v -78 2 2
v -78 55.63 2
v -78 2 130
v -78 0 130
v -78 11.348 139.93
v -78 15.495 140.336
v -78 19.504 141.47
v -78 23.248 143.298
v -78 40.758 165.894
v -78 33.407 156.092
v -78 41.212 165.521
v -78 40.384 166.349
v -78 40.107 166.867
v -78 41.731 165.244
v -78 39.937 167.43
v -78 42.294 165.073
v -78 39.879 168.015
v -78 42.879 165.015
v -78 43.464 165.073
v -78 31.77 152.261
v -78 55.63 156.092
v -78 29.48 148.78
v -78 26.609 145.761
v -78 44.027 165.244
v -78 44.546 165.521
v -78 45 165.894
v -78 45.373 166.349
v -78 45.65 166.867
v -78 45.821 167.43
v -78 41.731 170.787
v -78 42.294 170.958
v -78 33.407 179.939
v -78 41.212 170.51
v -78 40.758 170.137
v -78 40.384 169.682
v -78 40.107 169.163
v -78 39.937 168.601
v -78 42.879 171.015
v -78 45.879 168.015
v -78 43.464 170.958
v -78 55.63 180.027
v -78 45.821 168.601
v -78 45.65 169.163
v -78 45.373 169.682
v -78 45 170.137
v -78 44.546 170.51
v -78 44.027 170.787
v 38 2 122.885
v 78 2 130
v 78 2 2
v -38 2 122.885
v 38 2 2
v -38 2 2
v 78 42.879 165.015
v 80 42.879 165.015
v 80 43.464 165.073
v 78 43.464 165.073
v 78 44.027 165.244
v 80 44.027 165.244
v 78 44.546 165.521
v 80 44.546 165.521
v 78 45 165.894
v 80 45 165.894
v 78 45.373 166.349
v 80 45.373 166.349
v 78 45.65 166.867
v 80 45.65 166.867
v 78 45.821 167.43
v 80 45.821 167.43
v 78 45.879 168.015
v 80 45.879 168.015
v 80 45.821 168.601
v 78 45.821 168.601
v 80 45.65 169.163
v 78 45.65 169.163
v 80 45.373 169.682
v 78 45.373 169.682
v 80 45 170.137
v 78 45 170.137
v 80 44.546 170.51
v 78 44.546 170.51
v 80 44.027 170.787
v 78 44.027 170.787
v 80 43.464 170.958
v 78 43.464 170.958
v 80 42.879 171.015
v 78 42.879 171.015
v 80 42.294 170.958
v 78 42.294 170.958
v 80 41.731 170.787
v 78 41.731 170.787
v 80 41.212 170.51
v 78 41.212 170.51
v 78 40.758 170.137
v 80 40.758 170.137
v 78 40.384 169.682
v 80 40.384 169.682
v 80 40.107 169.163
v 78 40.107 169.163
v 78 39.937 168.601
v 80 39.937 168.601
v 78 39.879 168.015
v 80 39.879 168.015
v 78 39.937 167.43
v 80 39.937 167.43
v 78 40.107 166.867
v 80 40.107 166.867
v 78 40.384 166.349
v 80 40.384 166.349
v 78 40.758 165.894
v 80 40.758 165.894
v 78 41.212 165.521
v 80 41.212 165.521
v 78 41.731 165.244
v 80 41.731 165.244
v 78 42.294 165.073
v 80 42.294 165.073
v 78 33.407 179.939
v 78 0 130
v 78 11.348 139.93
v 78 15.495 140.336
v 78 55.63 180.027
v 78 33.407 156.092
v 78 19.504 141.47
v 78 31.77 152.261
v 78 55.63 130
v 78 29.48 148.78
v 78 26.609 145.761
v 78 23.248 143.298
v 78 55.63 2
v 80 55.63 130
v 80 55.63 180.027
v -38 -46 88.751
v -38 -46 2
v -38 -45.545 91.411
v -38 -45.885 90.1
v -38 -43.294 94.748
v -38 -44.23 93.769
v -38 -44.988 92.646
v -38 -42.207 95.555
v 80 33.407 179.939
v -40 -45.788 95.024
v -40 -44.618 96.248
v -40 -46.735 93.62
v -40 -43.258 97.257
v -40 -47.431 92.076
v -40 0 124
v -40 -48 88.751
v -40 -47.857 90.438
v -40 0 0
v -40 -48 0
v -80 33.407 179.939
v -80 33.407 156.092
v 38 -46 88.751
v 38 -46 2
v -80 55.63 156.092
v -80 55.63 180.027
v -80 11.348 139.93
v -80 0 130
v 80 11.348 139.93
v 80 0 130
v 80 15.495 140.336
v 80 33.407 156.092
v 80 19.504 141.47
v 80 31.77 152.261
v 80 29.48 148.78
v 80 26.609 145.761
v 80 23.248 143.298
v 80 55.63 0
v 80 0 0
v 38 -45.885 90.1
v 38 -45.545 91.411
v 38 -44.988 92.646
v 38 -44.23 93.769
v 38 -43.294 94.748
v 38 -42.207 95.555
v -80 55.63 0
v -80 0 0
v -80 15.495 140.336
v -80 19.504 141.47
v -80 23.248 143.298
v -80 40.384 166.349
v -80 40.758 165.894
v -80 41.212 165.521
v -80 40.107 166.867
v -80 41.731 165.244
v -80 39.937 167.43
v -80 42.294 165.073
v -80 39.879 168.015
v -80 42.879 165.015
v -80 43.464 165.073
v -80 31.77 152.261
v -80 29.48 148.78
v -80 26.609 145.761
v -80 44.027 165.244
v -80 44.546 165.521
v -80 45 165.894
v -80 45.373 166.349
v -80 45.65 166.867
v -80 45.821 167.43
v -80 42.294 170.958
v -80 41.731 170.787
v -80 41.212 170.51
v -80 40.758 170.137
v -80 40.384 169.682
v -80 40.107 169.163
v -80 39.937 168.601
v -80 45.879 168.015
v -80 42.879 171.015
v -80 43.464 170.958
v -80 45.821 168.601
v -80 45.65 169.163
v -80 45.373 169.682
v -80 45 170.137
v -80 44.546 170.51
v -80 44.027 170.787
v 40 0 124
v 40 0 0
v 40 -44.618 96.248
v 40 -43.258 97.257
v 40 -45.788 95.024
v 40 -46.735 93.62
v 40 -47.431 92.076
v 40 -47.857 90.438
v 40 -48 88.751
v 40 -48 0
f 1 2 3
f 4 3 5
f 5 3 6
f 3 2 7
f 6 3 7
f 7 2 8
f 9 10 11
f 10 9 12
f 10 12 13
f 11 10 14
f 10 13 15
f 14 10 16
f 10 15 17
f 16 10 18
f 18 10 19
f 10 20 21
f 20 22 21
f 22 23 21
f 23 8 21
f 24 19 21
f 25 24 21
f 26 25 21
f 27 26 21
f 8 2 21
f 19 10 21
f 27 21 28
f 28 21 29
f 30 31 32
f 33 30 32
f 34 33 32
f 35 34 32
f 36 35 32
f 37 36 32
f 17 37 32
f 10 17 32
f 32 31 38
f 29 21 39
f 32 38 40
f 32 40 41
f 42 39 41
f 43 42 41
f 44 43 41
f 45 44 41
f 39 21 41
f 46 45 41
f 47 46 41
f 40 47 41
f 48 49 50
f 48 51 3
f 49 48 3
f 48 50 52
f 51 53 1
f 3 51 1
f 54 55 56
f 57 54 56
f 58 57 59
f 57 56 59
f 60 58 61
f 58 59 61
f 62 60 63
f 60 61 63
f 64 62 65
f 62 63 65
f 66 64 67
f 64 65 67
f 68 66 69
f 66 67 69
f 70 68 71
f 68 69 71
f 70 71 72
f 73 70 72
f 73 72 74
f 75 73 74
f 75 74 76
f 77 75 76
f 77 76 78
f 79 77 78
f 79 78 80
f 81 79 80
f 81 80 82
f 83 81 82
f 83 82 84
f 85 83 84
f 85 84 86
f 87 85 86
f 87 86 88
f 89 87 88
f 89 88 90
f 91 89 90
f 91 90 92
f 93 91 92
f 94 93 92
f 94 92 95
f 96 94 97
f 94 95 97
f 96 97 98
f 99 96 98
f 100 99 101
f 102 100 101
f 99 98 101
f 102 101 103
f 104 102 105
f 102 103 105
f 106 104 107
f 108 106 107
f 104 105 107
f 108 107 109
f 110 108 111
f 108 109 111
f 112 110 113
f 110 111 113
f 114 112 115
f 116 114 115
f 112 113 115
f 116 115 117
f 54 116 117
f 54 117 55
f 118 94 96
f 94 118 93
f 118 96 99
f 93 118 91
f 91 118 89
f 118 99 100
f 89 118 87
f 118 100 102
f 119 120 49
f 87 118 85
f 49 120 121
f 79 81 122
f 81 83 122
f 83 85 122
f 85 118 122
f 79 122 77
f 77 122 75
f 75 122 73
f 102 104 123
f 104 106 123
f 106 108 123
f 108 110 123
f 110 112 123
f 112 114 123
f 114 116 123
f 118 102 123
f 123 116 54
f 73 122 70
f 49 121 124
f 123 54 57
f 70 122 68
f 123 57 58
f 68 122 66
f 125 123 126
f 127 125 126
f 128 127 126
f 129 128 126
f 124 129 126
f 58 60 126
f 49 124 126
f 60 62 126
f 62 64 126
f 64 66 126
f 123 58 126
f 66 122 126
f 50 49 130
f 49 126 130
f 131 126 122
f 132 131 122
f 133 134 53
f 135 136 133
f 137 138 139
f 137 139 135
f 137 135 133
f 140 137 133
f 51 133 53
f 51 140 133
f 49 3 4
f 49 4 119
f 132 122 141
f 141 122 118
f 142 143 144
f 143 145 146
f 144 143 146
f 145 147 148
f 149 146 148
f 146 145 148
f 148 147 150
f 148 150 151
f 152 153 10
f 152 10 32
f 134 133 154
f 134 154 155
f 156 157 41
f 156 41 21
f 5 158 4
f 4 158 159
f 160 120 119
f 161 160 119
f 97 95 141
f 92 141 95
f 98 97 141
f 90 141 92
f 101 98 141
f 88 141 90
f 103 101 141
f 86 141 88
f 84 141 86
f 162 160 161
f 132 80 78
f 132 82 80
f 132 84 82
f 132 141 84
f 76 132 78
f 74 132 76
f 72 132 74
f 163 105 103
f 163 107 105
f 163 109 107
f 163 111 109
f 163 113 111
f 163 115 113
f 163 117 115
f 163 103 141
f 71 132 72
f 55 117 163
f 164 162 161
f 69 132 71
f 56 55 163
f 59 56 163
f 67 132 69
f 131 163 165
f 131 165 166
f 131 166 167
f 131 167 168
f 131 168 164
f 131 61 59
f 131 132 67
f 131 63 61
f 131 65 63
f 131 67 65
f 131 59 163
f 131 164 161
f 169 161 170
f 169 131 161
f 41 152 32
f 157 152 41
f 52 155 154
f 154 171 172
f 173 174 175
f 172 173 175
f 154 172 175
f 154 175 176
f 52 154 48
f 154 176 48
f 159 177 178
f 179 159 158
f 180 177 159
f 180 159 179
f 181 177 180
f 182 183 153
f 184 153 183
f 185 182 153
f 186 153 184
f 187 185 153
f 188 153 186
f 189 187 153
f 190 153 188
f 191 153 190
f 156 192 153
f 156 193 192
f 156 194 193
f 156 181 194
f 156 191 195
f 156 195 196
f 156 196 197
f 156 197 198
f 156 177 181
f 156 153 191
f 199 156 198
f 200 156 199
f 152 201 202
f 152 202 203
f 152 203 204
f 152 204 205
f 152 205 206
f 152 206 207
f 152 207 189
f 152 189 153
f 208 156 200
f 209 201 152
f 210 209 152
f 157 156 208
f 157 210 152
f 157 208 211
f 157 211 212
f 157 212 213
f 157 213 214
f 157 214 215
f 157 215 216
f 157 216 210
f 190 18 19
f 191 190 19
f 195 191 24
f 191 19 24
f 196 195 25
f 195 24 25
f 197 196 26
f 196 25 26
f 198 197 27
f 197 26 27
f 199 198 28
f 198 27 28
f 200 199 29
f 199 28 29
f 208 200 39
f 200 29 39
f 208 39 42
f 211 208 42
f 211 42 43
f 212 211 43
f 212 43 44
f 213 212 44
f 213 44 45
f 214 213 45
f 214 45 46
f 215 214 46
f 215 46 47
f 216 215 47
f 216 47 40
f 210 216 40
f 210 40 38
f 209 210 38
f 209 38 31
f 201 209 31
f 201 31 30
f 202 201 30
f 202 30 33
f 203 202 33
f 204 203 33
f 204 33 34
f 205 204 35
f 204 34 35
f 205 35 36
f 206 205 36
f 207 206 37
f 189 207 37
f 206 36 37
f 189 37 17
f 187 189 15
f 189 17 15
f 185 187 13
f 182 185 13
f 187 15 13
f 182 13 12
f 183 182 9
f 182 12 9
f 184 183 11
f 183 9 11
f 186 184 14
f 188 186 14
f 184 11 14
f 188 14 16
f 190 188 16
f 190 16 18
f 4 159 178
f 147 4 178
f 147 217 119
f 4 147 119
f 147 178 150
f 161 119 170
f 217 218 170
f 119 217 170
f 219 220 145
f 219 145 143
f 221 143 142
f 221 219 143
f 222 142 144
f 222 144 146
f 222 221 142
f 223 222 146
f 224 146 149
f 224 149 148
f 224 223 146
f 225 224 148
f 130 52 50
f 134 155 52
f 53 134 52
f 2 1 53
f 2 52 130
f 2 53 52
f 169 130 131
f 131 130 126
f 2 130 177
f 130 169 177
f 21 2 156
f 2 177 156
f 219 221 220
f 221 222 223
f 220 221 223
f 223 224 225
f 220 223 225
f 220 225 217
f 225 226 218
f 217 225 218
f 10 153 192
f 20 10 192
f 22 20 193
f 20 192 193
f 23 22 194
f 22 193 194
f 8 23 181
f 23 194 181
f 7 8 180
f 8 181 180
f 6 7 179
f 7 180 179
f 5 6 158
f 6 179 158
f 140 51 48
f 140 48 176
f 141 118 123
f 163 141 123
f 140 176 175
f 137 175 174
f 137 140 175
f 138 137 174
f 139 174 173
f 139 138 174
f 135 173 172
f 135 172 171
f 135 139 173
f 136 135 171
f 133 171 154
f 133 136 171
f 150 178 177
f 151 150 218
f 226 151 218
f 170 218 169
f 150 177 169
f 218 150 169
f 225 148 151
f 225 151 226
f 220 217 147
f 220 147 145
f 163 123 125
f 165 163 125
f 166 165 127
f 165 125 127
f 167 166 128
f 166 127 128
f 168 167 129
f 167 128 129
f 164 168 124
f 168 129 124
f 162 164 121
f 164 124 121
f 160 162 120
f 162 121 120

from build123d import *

# Parameters (mm, degrees)
EXTRUDE_1_DEPTH          = 124
SKETCH_2_W               = 160
SKETCH_2_H               = 55.63
EXTRUDE_2_DEPTH          = 6
CUT_EXTRUDE_1_DEPTH      = 186.458073159
CUT_EXTRUDE_1_DEPTH_BACK = 186.458073159
SHELL_START              = -78
SHELL_1_OUTLINE_W        = 53.63
SHELL_1_OUTLINE_H        = 126
SHELL_1_DEPTH            = 156
SHELL_START_2            = -38
SHELL_1_2_DEPTH          = 76
SKETCH_6_W               = 156
SKETCH_6_H               = 53.63
CUT_EXTRUDE_2_DEPTH      = 3
EXTRUDE_3_DEPTH          = 2
SKETCH_8_R               = 23.405642618
CUT_EXTRUDE_3_DEPTH      = 231.346358066
EXTRUDE_4_DEPTH          = 2
EXTRUDE_START            = -2
EXTRUDE_5_DEPTH          = 2
SKETCH_11_R              = 3
CUT_EXTRUDE_4_DEPTH      = 248.192749183


# Read off the part's stored shape, not the designer's step: 抽壳1
with BuildPart() as part:
    # 草图1 → 凸台-拉伸1 (new body)
    with BuildSketch(Plane.XY):
        Polygon((-80, 0), (-40, 0), (-40, -48), (40, -48), (40, 0), (80, 0), (80, 55.63), (-80, 55.63), align=None)
    extrude(amount=EXTRUDE_1_DEPTH)

    # 草图2 → 凸台-拉伸2 (add)
    with BuildSketch(Plane.XY.offset(124)):
        with Locations((0, 27.815)):
            Rectangle(SKETCH_2_W, SKETCH_2_H)
    extrude(amount=EXTRUDE_2_DEPTH)

    # 草图4 → 切除-拉伸1 (cut, two sides: drawn at the far end of the back side and taken through both)
    with BuildSketch(Plane.ZY.offset(40).offset(-CUT_EXTRUDE_1_DEPTH_BACK)):
        with BuildLine():
            Line((124, 0), (97.256578086, -43.258479388))
            ThreePointArc((97.256578086, -43.258479388), (93.619837537, -46.734551903), (88.750792142, -48))
            Line((88.750792142, -48), (88.750792142, -53.726448165))
            Line((88.750792142, -53.726448165), (126.100983763, -53.726448165))
            Line((126.100983763, -53.726448165), (126.100983763, 0))
            Line((126.100983763, 0), (124, 0))
        make_face()
    extrude(amount=CUT_EXTRUDE_1_DEPTH + CUT_EXTRUDE_1_DEPTH_BACK, mode=Mode.SUBTRACT)

    # 抽壳1 outline → 抽壳1 (cut)
    with BuildSketch(Plane.YZ.offset(SHELL_START)):
        with Locations((28.815, 65)):
            Rectangle(SHELL_1_OUTLINE_W, SHELL_1_OUTLINE_H)
    extrude(amount=SHELL_1_DEPTH, mode=Mode.SUBTRACT)

    # Shell 1 2 outline → Shell 1 2 (cut)
    with BuildSketch(Plane.YZ.offset(SHELL_START_2)):
        with BuildLine():
            Line((-46, 88.750792142), (-46, 2))
            Line((-46, 2), (2, 2))
            Line((2, 2), (2, 122.885106998))
            Line((2, 122.885106998), (-42.20678351, 95.555420897))
            ThreePointArc((-42.20678351, 95.555420897), (-44.987641522, 92.646028458), (-46, 88.750792142))
        make_face()
    extrude(amount=SHELL_1_2_DEPTH, mode=Mode.SUBTRACT)

    # 草图6 → 切除-拉伸2 (cut)
    with BuildSketch(Plane(origin=(0, 0, 128), x_dir=(-1, 0, 0), z_dir=(0, 0, -1))):
        with Locations((0, 28.815)):
            Rectangle(SKETCH_6_W, SKETCH_6_H)
    extrude(amount=-CUT_EXTRUDE_2_DEPTH, mode=Mode.SUBTRACT)

    # 草图7 → 凸台-拉伸3 (add)
    with BuildSketch(Plane.ZY.offset(80)):
        Polygon((130, 55.63), (156.092113107, 55.63), (156.092113107, 29.820089386), (130, 0), align=None)
    extrude(amount=-EXTRUDE_3_DEPTH)

    # 草图8 → 切除-拉伸3 (cut, through all)
    with BuildSketch(Plane.ZY.offset(80)):
        with Locations((163.334420687, 11.150000051)):
            Circle(SKETCH_8_R)
    extrude(amount=-CUT_EXTRUDE_3_DEPTH, mode=Mode.SUBTRACT)

    # 草图9 → 凸台-拉伸4 (add)
    with BuildSketch(Plane.ZY.offset(80)):
        Polygon((156.092113107, 33.406978446), (179.938761178, 33.406978446), (180.026549011, 55.62973882), (156.092113107, 55.63), align=None)
    extrude(amount=-EXTRUDE_4_DEPTH)

    # 草图10 → 凸台-拉伸5 (add)
    with BuildSketch(Plane(origin=(80, 0, 0), x_dir=(0, 0, -1), z_dir=(1, 0, 0)).offset(EXTRUDE_START)):
        with BuildLine():
            Line((-130, 55.63), (-180.026549011, 55.62973882))
            Line((-180.026549011, 55.62973882), (-179.938761178, 33.406978446))
            Line((-179.938761178, 33.406978446), (-156.092113107, 33.406978446))
            ThreePointArc((-156.092113107, 33.406978446), (-144.454345373, 24.983541264), (-139.929618433, 11.348337638))
            Line((-139.929618433, 11.348337638), (-130, 0))
            Line((-130, 0), (-130, 55.63))
        make_face()
    extrude(amount=EXTRUDE_5_DEPTH)

    # 草图11 → 切除-拉伸4 (cut, through all)
    with BuildSketch(Plane(origin=(80, 0, 0), x_dir=(0, 0, -1), z_dir=(1, 0, 0))):
        with Locations((-168.015437143, 42.878856115)):
            Circle(SKETCH_11_R)
    extrude(amount=-CUT_EXTRUDE_4_DEPTH, mode=Mode.SUBTRACT)


solid = part.part
